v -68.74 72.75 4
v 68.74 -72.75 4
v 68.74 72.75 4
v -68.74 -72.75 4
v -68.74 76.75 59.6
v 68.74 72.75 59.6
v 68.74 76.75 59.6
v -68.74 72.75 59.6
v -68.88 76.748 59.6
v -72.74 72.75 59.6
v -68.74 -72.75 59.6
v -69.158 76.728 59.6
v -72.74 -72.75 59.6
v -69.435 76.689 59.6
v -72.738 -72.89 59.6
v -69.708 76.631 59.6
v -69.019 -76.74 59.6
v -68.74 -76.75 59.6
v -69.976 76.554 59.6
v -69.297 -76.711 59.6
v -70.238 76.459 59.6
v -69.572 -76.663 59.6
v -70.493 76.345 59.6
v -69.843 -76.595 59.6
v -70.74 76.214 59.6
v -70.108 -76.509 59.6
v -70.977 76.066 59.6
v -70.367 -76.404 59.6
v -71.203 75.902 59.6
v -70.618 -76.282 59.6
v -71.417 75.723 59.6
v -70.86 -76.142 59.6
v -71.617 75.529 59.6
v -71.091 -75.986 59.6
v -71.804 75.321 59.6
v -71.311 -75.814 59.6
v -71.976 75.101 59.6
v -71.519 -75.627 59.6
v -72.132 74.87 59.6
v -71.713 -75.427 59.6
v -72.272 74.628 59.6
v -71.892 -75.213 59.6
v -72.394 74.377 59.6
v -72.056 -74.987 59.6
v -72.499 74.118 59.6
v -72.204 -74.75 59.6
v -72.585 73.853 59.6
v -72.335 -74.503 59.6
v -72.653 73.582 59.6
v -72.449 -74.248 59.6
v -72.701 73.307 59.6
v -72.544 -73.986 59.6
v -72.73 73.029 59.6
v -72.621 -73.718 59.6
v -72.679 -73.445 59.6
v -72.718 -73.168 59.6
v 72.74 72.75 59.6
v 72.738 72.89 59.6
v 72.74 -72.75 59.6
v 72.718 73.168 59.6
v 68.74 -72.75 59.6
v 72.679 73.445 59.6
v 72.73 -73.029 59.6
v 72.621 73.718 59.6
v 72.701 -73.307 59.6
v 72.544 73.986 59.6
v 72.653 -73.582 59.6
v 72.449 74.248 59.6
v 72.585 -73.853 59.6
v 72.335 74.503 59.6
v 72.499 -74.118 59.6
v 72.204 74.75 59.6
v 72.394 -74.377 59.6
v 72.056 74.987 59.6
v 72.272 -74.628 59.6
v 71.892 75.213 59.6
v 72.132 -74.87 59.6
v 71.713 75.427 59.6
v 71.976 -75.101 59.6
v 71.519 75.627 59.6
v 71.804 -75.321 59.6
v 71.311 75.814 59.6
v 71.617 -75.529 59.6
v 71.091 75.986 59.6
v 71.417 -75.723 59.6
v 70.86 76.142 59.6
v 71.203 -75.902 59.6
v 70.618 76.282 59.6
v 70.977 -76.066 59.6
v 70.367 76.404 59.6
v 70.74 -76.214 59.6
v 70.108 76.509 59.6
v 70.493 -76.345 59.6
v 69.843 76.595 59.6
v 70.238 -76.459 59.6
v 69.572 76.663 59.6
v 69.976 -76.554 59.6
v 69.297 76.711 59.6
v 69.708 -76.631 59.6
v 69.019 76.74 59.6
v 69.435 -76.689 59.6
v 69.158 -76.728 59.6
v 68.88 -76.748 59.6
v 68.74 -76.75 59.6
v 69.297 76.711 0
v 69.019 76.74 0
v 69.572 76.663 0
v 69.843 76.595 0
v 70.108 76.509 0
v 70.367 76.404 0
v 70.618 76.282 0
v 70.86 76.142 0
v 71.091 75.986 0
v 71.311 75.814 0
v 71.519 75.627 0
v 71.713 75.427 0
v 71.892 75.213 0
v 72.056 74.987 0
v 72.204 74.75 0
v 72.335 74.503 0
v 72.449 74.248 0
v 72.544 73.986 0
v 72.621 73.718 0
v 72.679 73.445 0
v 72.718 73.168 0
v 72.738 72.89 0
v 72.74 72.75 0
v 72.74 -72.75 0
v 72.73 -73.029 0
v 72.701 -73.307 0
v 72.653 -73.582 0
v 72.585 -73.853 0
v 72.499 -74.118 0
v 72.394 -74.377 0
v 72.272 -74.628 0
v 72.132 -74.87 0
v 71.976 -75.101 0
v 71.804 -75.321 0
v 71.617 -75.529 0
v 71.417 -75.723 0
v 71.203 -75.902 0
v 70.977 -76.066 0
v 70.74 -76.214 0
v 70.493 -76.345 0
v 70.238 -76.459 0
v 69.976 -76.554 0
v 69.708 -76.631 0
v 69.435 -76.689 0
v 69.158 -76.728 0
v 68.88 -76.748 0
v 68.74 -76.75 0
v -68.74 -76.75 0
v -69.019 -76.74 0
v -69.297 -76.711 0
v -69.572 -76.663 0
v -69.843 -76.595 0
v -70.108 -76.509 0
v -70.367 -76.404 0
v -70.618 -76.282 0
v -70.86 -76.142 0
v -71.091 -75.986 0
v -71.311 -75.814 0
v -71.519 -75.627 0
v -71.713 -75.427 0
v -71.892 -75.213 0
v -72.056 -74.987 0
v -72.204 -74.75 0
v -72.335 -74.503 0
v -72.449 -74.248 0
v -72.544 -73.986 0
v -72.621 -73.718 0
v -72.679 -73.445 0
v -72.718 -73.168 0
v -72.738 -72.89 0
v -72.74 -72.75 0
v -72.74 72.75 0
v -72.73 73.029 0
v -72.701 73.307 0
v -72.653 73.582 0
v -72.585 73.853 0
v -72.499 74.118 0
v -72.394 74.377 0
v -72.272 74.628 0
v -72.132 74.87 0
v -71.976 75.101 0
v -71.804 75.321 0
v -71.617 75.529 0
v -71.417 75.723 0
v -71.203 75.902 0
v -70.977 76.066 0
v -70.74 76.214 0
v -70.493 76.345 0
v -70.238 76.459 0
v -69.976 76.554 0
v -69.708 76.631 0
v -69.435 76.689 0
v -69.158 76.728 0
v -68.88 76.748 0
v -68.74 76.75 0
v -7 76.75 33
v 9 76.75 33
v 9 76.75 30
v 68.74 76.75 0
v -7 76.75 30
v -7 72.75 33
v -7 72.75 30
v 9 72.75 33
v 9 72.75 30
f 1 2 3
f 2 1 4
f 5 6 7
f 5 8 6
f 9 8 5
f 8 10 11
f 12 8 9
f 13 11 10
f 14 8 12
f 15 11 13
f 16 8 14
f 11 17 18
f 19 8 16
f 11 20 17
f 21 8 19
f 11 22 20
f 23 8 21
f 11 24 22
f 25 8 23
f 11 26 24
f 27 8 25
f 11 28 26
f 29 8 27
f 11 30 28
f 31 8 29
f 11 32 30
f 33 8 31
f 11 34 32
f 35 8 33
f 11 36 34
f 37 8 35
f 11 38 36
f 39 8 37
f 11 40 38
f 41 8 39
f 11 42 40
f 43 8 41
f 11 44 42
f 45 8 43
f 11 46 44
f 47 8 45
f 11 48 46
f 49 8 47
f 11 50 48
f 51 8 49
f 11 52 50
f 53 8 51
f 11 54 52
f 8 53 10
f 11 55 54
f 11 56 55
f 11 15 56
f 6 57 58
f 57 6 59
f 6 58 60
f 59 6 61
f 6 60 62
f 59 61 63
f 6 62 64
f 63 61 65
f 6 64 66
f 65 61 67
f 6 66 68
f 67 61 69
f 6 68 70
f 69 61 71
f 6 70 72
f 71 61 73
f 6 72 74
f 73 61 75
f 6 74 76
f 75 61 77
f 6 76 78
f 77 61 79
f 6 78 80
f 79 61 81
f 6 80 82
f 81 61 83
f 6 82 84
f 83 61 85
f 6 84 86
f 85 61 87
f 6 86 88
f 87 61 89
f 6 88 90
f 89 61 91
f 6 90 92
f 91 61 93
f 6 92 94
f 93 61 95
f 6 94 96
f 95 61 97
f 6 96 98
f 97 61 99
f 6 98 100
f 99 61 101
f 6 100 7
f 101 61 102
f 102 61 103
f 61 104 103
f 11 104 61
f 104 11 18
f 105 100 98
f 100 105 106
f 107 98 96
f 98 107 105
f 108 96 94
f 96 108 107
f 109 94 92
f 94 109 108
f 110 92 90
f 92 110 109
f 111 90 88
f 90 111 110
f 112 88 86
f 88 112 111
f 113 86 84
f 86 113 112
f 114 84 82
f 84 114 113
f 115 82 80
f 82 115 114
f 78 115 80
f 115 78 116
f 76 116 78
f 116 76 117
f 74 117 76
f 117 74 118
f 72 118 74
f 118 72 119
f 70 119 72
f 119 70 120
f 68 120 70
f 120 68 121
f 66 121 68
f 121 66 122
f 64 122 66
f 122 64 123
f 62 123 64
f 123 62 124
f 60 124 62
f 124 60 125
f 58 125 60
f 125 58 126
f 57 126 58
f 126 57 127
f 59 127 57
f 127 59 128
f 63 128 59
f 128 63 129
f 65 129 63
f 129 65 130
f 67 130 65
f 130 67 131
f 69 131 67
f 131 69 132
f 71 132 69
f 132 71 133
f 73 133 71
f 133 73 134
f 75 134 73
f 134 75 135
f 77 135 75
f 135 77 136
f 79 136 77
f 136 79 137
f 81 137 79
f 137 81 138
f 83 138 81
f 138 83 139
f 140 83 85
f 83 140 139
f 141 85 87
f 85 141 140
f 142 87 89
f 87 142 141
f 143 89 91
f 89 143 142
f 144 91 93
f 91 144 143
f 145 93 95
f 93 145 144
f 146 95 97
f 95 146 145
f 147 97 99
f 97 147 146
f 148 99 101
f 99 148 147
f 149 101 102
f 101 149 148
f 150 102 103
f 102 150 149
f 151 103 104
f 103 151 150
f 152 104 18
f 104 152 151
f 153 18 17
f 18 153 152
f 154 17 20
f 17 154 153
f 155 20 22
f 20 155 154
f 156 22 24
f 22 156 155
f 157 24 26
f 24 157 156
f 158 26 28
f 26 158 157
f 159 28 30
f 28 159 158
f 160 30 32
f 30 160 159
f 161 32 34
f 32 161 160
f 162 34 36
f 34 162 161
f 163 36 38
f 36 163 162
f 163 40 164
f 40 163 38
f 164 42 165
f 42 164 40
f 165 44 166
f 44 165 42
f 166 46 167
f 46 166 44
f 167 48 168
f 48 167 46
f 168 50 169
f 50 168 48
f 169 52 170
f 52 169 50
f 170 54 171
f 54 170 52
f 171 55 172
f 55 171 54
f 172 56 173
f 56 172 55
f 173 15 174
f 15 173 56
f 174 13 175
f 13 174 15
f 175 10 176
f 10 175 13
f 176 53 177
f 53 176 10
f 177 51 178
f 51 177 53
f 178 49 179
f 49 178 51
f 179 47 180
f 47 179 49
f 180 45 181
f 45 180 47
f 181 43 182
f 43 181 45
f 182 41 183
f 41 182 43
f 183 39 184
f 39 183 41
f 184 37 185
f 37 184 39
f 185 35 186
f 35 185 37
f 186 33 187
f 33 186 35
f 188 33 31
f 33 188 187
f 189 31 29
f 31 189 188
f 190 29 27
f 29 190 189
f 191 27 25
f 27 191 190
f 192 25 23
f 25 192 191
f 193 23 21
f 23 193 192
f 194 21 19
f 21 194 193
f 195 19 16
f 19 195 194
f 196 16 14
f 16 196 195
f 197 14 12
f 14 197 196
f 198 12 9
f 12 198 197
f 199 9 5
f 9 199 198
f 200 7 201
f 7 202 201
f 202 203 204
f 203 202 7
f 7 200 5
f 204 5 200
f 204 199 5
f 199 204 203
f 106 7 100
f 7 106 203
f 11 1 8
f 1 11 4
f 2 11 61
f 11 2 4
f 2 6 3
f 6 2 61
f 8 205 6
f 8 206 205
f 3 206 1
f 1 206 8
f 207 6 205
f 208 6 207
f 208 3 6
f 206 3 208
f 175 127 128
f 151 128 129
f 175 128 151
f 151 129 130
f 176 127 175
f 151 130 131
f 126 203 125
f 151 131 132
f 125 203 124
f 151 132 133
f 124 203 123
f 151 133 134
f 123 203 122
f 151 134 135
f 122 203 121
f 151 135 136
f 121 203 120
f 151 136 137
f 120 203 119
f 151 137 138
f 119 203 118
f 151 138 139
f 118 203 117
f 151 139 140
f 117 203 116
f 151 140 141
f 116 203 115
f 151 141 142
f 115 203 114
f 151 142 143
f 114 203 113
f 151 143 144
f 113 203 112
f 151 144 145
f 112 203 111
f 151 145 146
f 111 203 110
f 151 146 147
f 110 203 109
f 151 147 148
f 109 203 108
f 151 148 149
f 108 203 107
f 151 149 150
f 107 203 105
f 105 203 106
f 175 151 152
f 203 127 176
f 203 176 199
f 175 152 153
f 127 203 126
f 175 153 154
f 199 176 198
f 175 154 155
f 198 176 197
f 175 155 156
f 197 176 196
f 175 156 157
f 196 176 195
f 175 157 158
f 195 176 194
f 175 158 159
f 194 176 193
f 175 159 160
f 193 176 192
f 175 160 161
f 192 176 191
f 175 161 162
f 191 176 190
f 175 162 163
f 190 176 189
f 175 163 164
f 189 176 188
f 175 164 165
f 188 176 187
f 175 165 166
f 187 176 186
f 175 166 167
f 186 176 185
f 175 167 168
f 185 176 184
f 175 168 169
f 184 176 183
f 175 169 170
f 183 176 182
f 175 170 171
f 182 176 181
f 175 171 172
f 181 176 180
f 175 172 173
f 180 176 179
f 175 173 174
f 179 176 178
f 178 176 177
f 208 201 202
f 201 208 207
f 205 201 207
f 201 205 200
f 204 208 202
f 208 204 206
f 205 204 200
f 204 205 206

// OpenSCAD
///* [Rendering options] */
// Show placeholder PCB in OpenSCAD preview
show_pcb = false;
// Lid mounting method
lid_model = "cap"; // [cap, inner-fit]
// Conditional rendering
render = "case"; // [all, case, lid]

/* [Dimensions] */
// Height of the PCB mounting stand-offs between the bottom of the case and the PCB
standoff_height = 5;
// PCB thickness
pcb_thickness = 1.6;
// Bottom layer thickness
floor_height = 4;
// Case wall thickness
wall_thickness = 4;
// Space between the top of the PCB and the top of the case
headroom = 45;

/* [Hidden] */
$fa = $preview ? 10 : 4;
$fs = 0.2;
inner_height = floor_height + standoff_height + pcb_thickness + headroom;

module centered_hole_diameter(center_x, center_y, diameter)
{ // These holes are in the kicad coord system
    coords = [ center_x, center_y ];
    translate([ coords[0], coords[1], -0.5 ]) cylinder(h = floor_height + 1, d = diameter, center = false);
}

module centered_hole_radius(center_x, center_y, center_z, radius)
{ // These holes are in the kicad coord system
    coords = [ center_x, center_y ];
    translate([ coords[0], coords[1], center_z ]) cylinder(h = (floor_height + 1) * 2, r = radius, center = false);
}

module wall(thickness, height)
{
    linear_extrude(height, convexity = 10)
    {
        difference()
        {
            offset(r = thickness) children();
            children();
        }
    }
}

module bottom(thickness, height)
{
    linear_extrude(height, convexity = 3)
    {
        offset(r = thickness) children();
    }
}

module joystick()
{
    centered_hole_diameter(center_x = 114.835, center_y = 116.42, diameter = 0.9);
    centered_hole_diameter(center_x = 117.335, center_y = 116.42, diameter = 0.9);
    centered_hole_diameter(center_x = 119.835, center_y = 116.42, diameter = 0.9);

    // Right Side data holes
    centered_hole_diameter(center_x = 126.065, center_y = 122.65, diameter = 0.9);
    centered_hole_diameter(center_x = 126.065, center_y = 125.15, diameter = 0.9);
    centered_hole_diameter(center_x = 126.065, center_y = 127.65, diameter = 0.9);

    // Button holes
    centered_hole_diameter(center_x = 114.085, center_y = 130.9, diameter = 1.2);
    centered_hole_diameter(center_x = 120.585, center_y = 130.9, diameter = 1.2);
    centered_hole_diameter(center_x = 114.085, center_y = 135.4, diameter = 1.2);
    centered_hole_diameter(center_x = 120.585, center_y = 135.4, diameter = 1.2);

    // Mounting holes
    centered_hole_diameter(center_x = 111.01, center_y = 120.15, diameter = 1.5);
    centered_hole_diameter(center_x = 123.66, center_y = 120.15, diameter = 1.5);
    centered_hole_diameter(center_x = 111.01, center_y = 130.15, diameter = 1.5);
    centered_hole_diameter(center_x = 123.66, center_y = 130.15, diameter = 1.5);
}

module slider(recess_depth, recess_width, recess_length, recess_x, recess_y, reccess_w_l_offset)
{

    translate([ recess_x, recess_y, 0 ])
    {
        difference()
        {
            difference()
            {
                // Outer shell of recess
                translate([ 0, 0, -recess_depth ])
                    cube([ recess_width + 2 * wall_thickness, recess_length + 2 * wall_thickness, recess_depth ]);
                    // Inner cavity of recess
                    translate([ wall_thickness, wall_thickness, -recess_depth + wall_thickness ])
                        cube([ recess_width, recess_length, recess_depth + 1 ]);
            }

            // Inner hole coords 
            data_pin_x = (recess_width - 3.75) / 2 + wall_thickness;
            data_pin_y_top = wall_thickness + reccess_w_l_offset/2;

            recess_center_y = wall_thickness + reccess_w_l_offset/2 + 127.5 / 2;

            centered_hole_radius(center_x = data_pin_x, center_y = data_pin_y_top , center_z = -(recess_depth + 1) , radius = 0.8);

            // Pins
            centered_hole_radius(center_x = data_pin_x, center_y = data_pin_y_top + 127.5 , center_z = -(recess_depth + 1) , radius = 0.8);
            centered_hole_radius(center_x = data_pin_x + 3.75, center_y = data_pin_y_top + 127.5 , center_z = -(recess_depth + 1) , radius = 0.8);

            // Bottom Hole
            centered_hole_radius(center_x = recess_width/2 + wall_thickness, center_y = recess_center_y + 42.1, center_z = -(recess_depth + 1), radius = 1);

            // Top hole
            centered_hole_radius(center_x = recess_width/2 + wall_thickness, center_y = recess_center_y - 40.1, center_z = -(recess_depth + 1), radius = 1);

        }
        
    }
}

module lid(thickness, height, edge)
{
    reccess_w_l_offset = 4;     // Offset of the recess with 4 because of 3d printer limitations
    recess_depth = 8;            // How far the recess protrudes down
    recess_width = 8.4 + reccess_w_l_offset;
    recess_length = 128 + reccess_w_l_offset; 
    recess_x = 5;               // X position of the recess
    recess_y = 0;               // Y position of the recess


    difference()
    {
        union()
        {
            // Main lid body
            linear_extrude(height, convexity = 10)
            {
                offset(r = thickness) children();
            }

            // Edge lip
            translate([ 0, 0, -edge ]) difference()
            {
                linear_extrude(edge, convexity = 10)
                {
                    offset(r = -0.2) children();
                }
                translate([ 0, 0, -0.5 ]) linear_extrude(edge + 1, convexity = 10)
                {
                    offset(r = -1.2) children();
                }
            }

            // Add the slider in the recess
            slider(recess_depth, recess_width, recess_length, recess_x, recess_y, reccess_w_l_offset);
        }

        // Extrude inner cavity from rest of lid
        translate([ recess_x, recess_y, 0 ])
            translate([ wall_thickness, wall_thickness, -recess_depth + wall_thickness ])
                cube([ recess_width, recess_length, recess_depth + 1 + wall_thickness ]);

        // === Logo ===
        translate([ 80, 22, height - 2 ]) linear_extrude(2.1)
        {
            offset(r = 0.1) scale([ 0.12, -0.12, 1 ]) import("case-logo.svg", center = true);
        }

        // === Buttons ===
        translate([ 55, 119, height - 5 ]) cylinder(r = 33.3 / 2, h = 10, $fn = 6);

        // === Joystick ===
        translate([ 0, 0, 0 ]) joystick();
    }
}

module box(wall_thick, bottom_layers, height)
{
    if (render == "all" || render == "case")
    {
        difference()
        {
            union()
            {
                translate([ 0, 0, bottom_layers ]) wall(wall_thick, height) children();
                bottom(wall_thick, bottom_layers) children();
            }
        }
    }

    if (render == "all" || render == "lid")
    {
        translate([ 0, 0, height + bottom_layers + 0.1 ])
            lid(wall_thick, bottom_layers, lid_model == "inner-fit" ? headroom - 2.5 : bottom_layers) children();
    }
}

module mount(drill, space, height)
{
    translate([ 0, 0, height / 2 ]) difference()
    {
        cylinder(h = height, r = (space / 2), center = true);
        cylinder(h = (height * 2), r = (drill / 2), center = true);

        translate([ 0, 0, height / 2 + 0.01 ]) children();
    }
}

module connector(min_x, min_y, max_x, max_y, height)
{
    size_x = max_x - min_x;
    size_y = max_y - min_y;
    translate([ (min_x + max_x) / 2, (min_y + max_y) / 2, height / 2 ]) cube([ size_x, size_y, height ], center = true);
}

module pcb()
{
    thickness = 1.6;

    color("#009900") difference()
    {
        linear_extrude(thickness)
        {
            polygon(points = [ [ 0, 0 ], [ 135.48, 0 ], [ 135.48, 143.5 ], [ 0, 143.5 ] ]);
        }
    }
}

module case_outline()
{
    polygon(points = [ [ -1, -1 ], [ 136.48, -1 ], [ 136.48, 144.5 ], [ -1, 144.5 ] ]);
}

rotate([ render == "lid" ? 180 : 0, 0, 0 ]) scale([ 1, -1, 1 ]) translate([ -67.74, -71.75, 0 ])
{
    pcb_top = floor_height + standoff_height + pcb_thickness;

    difference()
    {
        box(wall_thickness, floor_height, inner_height)
        {
            case_outline();
        }

        // Add square hole in wall at y=0
        // Accounting for the translation and scaling
        scale([ 1, -1, 1 ])                          // Match the case's scaling
            translate([ 68.74 - 8, 0, 30 ])          // Position relative to the case
            cube([ 16, wall_thickness * 2 + 1, 3 ]); // Make hole slightly wider than wall
    }

    if (show_pcb && $preview)
    {
        translate([ 0, 0, floor_height + standoff_height ]) pcb();
    }
}
